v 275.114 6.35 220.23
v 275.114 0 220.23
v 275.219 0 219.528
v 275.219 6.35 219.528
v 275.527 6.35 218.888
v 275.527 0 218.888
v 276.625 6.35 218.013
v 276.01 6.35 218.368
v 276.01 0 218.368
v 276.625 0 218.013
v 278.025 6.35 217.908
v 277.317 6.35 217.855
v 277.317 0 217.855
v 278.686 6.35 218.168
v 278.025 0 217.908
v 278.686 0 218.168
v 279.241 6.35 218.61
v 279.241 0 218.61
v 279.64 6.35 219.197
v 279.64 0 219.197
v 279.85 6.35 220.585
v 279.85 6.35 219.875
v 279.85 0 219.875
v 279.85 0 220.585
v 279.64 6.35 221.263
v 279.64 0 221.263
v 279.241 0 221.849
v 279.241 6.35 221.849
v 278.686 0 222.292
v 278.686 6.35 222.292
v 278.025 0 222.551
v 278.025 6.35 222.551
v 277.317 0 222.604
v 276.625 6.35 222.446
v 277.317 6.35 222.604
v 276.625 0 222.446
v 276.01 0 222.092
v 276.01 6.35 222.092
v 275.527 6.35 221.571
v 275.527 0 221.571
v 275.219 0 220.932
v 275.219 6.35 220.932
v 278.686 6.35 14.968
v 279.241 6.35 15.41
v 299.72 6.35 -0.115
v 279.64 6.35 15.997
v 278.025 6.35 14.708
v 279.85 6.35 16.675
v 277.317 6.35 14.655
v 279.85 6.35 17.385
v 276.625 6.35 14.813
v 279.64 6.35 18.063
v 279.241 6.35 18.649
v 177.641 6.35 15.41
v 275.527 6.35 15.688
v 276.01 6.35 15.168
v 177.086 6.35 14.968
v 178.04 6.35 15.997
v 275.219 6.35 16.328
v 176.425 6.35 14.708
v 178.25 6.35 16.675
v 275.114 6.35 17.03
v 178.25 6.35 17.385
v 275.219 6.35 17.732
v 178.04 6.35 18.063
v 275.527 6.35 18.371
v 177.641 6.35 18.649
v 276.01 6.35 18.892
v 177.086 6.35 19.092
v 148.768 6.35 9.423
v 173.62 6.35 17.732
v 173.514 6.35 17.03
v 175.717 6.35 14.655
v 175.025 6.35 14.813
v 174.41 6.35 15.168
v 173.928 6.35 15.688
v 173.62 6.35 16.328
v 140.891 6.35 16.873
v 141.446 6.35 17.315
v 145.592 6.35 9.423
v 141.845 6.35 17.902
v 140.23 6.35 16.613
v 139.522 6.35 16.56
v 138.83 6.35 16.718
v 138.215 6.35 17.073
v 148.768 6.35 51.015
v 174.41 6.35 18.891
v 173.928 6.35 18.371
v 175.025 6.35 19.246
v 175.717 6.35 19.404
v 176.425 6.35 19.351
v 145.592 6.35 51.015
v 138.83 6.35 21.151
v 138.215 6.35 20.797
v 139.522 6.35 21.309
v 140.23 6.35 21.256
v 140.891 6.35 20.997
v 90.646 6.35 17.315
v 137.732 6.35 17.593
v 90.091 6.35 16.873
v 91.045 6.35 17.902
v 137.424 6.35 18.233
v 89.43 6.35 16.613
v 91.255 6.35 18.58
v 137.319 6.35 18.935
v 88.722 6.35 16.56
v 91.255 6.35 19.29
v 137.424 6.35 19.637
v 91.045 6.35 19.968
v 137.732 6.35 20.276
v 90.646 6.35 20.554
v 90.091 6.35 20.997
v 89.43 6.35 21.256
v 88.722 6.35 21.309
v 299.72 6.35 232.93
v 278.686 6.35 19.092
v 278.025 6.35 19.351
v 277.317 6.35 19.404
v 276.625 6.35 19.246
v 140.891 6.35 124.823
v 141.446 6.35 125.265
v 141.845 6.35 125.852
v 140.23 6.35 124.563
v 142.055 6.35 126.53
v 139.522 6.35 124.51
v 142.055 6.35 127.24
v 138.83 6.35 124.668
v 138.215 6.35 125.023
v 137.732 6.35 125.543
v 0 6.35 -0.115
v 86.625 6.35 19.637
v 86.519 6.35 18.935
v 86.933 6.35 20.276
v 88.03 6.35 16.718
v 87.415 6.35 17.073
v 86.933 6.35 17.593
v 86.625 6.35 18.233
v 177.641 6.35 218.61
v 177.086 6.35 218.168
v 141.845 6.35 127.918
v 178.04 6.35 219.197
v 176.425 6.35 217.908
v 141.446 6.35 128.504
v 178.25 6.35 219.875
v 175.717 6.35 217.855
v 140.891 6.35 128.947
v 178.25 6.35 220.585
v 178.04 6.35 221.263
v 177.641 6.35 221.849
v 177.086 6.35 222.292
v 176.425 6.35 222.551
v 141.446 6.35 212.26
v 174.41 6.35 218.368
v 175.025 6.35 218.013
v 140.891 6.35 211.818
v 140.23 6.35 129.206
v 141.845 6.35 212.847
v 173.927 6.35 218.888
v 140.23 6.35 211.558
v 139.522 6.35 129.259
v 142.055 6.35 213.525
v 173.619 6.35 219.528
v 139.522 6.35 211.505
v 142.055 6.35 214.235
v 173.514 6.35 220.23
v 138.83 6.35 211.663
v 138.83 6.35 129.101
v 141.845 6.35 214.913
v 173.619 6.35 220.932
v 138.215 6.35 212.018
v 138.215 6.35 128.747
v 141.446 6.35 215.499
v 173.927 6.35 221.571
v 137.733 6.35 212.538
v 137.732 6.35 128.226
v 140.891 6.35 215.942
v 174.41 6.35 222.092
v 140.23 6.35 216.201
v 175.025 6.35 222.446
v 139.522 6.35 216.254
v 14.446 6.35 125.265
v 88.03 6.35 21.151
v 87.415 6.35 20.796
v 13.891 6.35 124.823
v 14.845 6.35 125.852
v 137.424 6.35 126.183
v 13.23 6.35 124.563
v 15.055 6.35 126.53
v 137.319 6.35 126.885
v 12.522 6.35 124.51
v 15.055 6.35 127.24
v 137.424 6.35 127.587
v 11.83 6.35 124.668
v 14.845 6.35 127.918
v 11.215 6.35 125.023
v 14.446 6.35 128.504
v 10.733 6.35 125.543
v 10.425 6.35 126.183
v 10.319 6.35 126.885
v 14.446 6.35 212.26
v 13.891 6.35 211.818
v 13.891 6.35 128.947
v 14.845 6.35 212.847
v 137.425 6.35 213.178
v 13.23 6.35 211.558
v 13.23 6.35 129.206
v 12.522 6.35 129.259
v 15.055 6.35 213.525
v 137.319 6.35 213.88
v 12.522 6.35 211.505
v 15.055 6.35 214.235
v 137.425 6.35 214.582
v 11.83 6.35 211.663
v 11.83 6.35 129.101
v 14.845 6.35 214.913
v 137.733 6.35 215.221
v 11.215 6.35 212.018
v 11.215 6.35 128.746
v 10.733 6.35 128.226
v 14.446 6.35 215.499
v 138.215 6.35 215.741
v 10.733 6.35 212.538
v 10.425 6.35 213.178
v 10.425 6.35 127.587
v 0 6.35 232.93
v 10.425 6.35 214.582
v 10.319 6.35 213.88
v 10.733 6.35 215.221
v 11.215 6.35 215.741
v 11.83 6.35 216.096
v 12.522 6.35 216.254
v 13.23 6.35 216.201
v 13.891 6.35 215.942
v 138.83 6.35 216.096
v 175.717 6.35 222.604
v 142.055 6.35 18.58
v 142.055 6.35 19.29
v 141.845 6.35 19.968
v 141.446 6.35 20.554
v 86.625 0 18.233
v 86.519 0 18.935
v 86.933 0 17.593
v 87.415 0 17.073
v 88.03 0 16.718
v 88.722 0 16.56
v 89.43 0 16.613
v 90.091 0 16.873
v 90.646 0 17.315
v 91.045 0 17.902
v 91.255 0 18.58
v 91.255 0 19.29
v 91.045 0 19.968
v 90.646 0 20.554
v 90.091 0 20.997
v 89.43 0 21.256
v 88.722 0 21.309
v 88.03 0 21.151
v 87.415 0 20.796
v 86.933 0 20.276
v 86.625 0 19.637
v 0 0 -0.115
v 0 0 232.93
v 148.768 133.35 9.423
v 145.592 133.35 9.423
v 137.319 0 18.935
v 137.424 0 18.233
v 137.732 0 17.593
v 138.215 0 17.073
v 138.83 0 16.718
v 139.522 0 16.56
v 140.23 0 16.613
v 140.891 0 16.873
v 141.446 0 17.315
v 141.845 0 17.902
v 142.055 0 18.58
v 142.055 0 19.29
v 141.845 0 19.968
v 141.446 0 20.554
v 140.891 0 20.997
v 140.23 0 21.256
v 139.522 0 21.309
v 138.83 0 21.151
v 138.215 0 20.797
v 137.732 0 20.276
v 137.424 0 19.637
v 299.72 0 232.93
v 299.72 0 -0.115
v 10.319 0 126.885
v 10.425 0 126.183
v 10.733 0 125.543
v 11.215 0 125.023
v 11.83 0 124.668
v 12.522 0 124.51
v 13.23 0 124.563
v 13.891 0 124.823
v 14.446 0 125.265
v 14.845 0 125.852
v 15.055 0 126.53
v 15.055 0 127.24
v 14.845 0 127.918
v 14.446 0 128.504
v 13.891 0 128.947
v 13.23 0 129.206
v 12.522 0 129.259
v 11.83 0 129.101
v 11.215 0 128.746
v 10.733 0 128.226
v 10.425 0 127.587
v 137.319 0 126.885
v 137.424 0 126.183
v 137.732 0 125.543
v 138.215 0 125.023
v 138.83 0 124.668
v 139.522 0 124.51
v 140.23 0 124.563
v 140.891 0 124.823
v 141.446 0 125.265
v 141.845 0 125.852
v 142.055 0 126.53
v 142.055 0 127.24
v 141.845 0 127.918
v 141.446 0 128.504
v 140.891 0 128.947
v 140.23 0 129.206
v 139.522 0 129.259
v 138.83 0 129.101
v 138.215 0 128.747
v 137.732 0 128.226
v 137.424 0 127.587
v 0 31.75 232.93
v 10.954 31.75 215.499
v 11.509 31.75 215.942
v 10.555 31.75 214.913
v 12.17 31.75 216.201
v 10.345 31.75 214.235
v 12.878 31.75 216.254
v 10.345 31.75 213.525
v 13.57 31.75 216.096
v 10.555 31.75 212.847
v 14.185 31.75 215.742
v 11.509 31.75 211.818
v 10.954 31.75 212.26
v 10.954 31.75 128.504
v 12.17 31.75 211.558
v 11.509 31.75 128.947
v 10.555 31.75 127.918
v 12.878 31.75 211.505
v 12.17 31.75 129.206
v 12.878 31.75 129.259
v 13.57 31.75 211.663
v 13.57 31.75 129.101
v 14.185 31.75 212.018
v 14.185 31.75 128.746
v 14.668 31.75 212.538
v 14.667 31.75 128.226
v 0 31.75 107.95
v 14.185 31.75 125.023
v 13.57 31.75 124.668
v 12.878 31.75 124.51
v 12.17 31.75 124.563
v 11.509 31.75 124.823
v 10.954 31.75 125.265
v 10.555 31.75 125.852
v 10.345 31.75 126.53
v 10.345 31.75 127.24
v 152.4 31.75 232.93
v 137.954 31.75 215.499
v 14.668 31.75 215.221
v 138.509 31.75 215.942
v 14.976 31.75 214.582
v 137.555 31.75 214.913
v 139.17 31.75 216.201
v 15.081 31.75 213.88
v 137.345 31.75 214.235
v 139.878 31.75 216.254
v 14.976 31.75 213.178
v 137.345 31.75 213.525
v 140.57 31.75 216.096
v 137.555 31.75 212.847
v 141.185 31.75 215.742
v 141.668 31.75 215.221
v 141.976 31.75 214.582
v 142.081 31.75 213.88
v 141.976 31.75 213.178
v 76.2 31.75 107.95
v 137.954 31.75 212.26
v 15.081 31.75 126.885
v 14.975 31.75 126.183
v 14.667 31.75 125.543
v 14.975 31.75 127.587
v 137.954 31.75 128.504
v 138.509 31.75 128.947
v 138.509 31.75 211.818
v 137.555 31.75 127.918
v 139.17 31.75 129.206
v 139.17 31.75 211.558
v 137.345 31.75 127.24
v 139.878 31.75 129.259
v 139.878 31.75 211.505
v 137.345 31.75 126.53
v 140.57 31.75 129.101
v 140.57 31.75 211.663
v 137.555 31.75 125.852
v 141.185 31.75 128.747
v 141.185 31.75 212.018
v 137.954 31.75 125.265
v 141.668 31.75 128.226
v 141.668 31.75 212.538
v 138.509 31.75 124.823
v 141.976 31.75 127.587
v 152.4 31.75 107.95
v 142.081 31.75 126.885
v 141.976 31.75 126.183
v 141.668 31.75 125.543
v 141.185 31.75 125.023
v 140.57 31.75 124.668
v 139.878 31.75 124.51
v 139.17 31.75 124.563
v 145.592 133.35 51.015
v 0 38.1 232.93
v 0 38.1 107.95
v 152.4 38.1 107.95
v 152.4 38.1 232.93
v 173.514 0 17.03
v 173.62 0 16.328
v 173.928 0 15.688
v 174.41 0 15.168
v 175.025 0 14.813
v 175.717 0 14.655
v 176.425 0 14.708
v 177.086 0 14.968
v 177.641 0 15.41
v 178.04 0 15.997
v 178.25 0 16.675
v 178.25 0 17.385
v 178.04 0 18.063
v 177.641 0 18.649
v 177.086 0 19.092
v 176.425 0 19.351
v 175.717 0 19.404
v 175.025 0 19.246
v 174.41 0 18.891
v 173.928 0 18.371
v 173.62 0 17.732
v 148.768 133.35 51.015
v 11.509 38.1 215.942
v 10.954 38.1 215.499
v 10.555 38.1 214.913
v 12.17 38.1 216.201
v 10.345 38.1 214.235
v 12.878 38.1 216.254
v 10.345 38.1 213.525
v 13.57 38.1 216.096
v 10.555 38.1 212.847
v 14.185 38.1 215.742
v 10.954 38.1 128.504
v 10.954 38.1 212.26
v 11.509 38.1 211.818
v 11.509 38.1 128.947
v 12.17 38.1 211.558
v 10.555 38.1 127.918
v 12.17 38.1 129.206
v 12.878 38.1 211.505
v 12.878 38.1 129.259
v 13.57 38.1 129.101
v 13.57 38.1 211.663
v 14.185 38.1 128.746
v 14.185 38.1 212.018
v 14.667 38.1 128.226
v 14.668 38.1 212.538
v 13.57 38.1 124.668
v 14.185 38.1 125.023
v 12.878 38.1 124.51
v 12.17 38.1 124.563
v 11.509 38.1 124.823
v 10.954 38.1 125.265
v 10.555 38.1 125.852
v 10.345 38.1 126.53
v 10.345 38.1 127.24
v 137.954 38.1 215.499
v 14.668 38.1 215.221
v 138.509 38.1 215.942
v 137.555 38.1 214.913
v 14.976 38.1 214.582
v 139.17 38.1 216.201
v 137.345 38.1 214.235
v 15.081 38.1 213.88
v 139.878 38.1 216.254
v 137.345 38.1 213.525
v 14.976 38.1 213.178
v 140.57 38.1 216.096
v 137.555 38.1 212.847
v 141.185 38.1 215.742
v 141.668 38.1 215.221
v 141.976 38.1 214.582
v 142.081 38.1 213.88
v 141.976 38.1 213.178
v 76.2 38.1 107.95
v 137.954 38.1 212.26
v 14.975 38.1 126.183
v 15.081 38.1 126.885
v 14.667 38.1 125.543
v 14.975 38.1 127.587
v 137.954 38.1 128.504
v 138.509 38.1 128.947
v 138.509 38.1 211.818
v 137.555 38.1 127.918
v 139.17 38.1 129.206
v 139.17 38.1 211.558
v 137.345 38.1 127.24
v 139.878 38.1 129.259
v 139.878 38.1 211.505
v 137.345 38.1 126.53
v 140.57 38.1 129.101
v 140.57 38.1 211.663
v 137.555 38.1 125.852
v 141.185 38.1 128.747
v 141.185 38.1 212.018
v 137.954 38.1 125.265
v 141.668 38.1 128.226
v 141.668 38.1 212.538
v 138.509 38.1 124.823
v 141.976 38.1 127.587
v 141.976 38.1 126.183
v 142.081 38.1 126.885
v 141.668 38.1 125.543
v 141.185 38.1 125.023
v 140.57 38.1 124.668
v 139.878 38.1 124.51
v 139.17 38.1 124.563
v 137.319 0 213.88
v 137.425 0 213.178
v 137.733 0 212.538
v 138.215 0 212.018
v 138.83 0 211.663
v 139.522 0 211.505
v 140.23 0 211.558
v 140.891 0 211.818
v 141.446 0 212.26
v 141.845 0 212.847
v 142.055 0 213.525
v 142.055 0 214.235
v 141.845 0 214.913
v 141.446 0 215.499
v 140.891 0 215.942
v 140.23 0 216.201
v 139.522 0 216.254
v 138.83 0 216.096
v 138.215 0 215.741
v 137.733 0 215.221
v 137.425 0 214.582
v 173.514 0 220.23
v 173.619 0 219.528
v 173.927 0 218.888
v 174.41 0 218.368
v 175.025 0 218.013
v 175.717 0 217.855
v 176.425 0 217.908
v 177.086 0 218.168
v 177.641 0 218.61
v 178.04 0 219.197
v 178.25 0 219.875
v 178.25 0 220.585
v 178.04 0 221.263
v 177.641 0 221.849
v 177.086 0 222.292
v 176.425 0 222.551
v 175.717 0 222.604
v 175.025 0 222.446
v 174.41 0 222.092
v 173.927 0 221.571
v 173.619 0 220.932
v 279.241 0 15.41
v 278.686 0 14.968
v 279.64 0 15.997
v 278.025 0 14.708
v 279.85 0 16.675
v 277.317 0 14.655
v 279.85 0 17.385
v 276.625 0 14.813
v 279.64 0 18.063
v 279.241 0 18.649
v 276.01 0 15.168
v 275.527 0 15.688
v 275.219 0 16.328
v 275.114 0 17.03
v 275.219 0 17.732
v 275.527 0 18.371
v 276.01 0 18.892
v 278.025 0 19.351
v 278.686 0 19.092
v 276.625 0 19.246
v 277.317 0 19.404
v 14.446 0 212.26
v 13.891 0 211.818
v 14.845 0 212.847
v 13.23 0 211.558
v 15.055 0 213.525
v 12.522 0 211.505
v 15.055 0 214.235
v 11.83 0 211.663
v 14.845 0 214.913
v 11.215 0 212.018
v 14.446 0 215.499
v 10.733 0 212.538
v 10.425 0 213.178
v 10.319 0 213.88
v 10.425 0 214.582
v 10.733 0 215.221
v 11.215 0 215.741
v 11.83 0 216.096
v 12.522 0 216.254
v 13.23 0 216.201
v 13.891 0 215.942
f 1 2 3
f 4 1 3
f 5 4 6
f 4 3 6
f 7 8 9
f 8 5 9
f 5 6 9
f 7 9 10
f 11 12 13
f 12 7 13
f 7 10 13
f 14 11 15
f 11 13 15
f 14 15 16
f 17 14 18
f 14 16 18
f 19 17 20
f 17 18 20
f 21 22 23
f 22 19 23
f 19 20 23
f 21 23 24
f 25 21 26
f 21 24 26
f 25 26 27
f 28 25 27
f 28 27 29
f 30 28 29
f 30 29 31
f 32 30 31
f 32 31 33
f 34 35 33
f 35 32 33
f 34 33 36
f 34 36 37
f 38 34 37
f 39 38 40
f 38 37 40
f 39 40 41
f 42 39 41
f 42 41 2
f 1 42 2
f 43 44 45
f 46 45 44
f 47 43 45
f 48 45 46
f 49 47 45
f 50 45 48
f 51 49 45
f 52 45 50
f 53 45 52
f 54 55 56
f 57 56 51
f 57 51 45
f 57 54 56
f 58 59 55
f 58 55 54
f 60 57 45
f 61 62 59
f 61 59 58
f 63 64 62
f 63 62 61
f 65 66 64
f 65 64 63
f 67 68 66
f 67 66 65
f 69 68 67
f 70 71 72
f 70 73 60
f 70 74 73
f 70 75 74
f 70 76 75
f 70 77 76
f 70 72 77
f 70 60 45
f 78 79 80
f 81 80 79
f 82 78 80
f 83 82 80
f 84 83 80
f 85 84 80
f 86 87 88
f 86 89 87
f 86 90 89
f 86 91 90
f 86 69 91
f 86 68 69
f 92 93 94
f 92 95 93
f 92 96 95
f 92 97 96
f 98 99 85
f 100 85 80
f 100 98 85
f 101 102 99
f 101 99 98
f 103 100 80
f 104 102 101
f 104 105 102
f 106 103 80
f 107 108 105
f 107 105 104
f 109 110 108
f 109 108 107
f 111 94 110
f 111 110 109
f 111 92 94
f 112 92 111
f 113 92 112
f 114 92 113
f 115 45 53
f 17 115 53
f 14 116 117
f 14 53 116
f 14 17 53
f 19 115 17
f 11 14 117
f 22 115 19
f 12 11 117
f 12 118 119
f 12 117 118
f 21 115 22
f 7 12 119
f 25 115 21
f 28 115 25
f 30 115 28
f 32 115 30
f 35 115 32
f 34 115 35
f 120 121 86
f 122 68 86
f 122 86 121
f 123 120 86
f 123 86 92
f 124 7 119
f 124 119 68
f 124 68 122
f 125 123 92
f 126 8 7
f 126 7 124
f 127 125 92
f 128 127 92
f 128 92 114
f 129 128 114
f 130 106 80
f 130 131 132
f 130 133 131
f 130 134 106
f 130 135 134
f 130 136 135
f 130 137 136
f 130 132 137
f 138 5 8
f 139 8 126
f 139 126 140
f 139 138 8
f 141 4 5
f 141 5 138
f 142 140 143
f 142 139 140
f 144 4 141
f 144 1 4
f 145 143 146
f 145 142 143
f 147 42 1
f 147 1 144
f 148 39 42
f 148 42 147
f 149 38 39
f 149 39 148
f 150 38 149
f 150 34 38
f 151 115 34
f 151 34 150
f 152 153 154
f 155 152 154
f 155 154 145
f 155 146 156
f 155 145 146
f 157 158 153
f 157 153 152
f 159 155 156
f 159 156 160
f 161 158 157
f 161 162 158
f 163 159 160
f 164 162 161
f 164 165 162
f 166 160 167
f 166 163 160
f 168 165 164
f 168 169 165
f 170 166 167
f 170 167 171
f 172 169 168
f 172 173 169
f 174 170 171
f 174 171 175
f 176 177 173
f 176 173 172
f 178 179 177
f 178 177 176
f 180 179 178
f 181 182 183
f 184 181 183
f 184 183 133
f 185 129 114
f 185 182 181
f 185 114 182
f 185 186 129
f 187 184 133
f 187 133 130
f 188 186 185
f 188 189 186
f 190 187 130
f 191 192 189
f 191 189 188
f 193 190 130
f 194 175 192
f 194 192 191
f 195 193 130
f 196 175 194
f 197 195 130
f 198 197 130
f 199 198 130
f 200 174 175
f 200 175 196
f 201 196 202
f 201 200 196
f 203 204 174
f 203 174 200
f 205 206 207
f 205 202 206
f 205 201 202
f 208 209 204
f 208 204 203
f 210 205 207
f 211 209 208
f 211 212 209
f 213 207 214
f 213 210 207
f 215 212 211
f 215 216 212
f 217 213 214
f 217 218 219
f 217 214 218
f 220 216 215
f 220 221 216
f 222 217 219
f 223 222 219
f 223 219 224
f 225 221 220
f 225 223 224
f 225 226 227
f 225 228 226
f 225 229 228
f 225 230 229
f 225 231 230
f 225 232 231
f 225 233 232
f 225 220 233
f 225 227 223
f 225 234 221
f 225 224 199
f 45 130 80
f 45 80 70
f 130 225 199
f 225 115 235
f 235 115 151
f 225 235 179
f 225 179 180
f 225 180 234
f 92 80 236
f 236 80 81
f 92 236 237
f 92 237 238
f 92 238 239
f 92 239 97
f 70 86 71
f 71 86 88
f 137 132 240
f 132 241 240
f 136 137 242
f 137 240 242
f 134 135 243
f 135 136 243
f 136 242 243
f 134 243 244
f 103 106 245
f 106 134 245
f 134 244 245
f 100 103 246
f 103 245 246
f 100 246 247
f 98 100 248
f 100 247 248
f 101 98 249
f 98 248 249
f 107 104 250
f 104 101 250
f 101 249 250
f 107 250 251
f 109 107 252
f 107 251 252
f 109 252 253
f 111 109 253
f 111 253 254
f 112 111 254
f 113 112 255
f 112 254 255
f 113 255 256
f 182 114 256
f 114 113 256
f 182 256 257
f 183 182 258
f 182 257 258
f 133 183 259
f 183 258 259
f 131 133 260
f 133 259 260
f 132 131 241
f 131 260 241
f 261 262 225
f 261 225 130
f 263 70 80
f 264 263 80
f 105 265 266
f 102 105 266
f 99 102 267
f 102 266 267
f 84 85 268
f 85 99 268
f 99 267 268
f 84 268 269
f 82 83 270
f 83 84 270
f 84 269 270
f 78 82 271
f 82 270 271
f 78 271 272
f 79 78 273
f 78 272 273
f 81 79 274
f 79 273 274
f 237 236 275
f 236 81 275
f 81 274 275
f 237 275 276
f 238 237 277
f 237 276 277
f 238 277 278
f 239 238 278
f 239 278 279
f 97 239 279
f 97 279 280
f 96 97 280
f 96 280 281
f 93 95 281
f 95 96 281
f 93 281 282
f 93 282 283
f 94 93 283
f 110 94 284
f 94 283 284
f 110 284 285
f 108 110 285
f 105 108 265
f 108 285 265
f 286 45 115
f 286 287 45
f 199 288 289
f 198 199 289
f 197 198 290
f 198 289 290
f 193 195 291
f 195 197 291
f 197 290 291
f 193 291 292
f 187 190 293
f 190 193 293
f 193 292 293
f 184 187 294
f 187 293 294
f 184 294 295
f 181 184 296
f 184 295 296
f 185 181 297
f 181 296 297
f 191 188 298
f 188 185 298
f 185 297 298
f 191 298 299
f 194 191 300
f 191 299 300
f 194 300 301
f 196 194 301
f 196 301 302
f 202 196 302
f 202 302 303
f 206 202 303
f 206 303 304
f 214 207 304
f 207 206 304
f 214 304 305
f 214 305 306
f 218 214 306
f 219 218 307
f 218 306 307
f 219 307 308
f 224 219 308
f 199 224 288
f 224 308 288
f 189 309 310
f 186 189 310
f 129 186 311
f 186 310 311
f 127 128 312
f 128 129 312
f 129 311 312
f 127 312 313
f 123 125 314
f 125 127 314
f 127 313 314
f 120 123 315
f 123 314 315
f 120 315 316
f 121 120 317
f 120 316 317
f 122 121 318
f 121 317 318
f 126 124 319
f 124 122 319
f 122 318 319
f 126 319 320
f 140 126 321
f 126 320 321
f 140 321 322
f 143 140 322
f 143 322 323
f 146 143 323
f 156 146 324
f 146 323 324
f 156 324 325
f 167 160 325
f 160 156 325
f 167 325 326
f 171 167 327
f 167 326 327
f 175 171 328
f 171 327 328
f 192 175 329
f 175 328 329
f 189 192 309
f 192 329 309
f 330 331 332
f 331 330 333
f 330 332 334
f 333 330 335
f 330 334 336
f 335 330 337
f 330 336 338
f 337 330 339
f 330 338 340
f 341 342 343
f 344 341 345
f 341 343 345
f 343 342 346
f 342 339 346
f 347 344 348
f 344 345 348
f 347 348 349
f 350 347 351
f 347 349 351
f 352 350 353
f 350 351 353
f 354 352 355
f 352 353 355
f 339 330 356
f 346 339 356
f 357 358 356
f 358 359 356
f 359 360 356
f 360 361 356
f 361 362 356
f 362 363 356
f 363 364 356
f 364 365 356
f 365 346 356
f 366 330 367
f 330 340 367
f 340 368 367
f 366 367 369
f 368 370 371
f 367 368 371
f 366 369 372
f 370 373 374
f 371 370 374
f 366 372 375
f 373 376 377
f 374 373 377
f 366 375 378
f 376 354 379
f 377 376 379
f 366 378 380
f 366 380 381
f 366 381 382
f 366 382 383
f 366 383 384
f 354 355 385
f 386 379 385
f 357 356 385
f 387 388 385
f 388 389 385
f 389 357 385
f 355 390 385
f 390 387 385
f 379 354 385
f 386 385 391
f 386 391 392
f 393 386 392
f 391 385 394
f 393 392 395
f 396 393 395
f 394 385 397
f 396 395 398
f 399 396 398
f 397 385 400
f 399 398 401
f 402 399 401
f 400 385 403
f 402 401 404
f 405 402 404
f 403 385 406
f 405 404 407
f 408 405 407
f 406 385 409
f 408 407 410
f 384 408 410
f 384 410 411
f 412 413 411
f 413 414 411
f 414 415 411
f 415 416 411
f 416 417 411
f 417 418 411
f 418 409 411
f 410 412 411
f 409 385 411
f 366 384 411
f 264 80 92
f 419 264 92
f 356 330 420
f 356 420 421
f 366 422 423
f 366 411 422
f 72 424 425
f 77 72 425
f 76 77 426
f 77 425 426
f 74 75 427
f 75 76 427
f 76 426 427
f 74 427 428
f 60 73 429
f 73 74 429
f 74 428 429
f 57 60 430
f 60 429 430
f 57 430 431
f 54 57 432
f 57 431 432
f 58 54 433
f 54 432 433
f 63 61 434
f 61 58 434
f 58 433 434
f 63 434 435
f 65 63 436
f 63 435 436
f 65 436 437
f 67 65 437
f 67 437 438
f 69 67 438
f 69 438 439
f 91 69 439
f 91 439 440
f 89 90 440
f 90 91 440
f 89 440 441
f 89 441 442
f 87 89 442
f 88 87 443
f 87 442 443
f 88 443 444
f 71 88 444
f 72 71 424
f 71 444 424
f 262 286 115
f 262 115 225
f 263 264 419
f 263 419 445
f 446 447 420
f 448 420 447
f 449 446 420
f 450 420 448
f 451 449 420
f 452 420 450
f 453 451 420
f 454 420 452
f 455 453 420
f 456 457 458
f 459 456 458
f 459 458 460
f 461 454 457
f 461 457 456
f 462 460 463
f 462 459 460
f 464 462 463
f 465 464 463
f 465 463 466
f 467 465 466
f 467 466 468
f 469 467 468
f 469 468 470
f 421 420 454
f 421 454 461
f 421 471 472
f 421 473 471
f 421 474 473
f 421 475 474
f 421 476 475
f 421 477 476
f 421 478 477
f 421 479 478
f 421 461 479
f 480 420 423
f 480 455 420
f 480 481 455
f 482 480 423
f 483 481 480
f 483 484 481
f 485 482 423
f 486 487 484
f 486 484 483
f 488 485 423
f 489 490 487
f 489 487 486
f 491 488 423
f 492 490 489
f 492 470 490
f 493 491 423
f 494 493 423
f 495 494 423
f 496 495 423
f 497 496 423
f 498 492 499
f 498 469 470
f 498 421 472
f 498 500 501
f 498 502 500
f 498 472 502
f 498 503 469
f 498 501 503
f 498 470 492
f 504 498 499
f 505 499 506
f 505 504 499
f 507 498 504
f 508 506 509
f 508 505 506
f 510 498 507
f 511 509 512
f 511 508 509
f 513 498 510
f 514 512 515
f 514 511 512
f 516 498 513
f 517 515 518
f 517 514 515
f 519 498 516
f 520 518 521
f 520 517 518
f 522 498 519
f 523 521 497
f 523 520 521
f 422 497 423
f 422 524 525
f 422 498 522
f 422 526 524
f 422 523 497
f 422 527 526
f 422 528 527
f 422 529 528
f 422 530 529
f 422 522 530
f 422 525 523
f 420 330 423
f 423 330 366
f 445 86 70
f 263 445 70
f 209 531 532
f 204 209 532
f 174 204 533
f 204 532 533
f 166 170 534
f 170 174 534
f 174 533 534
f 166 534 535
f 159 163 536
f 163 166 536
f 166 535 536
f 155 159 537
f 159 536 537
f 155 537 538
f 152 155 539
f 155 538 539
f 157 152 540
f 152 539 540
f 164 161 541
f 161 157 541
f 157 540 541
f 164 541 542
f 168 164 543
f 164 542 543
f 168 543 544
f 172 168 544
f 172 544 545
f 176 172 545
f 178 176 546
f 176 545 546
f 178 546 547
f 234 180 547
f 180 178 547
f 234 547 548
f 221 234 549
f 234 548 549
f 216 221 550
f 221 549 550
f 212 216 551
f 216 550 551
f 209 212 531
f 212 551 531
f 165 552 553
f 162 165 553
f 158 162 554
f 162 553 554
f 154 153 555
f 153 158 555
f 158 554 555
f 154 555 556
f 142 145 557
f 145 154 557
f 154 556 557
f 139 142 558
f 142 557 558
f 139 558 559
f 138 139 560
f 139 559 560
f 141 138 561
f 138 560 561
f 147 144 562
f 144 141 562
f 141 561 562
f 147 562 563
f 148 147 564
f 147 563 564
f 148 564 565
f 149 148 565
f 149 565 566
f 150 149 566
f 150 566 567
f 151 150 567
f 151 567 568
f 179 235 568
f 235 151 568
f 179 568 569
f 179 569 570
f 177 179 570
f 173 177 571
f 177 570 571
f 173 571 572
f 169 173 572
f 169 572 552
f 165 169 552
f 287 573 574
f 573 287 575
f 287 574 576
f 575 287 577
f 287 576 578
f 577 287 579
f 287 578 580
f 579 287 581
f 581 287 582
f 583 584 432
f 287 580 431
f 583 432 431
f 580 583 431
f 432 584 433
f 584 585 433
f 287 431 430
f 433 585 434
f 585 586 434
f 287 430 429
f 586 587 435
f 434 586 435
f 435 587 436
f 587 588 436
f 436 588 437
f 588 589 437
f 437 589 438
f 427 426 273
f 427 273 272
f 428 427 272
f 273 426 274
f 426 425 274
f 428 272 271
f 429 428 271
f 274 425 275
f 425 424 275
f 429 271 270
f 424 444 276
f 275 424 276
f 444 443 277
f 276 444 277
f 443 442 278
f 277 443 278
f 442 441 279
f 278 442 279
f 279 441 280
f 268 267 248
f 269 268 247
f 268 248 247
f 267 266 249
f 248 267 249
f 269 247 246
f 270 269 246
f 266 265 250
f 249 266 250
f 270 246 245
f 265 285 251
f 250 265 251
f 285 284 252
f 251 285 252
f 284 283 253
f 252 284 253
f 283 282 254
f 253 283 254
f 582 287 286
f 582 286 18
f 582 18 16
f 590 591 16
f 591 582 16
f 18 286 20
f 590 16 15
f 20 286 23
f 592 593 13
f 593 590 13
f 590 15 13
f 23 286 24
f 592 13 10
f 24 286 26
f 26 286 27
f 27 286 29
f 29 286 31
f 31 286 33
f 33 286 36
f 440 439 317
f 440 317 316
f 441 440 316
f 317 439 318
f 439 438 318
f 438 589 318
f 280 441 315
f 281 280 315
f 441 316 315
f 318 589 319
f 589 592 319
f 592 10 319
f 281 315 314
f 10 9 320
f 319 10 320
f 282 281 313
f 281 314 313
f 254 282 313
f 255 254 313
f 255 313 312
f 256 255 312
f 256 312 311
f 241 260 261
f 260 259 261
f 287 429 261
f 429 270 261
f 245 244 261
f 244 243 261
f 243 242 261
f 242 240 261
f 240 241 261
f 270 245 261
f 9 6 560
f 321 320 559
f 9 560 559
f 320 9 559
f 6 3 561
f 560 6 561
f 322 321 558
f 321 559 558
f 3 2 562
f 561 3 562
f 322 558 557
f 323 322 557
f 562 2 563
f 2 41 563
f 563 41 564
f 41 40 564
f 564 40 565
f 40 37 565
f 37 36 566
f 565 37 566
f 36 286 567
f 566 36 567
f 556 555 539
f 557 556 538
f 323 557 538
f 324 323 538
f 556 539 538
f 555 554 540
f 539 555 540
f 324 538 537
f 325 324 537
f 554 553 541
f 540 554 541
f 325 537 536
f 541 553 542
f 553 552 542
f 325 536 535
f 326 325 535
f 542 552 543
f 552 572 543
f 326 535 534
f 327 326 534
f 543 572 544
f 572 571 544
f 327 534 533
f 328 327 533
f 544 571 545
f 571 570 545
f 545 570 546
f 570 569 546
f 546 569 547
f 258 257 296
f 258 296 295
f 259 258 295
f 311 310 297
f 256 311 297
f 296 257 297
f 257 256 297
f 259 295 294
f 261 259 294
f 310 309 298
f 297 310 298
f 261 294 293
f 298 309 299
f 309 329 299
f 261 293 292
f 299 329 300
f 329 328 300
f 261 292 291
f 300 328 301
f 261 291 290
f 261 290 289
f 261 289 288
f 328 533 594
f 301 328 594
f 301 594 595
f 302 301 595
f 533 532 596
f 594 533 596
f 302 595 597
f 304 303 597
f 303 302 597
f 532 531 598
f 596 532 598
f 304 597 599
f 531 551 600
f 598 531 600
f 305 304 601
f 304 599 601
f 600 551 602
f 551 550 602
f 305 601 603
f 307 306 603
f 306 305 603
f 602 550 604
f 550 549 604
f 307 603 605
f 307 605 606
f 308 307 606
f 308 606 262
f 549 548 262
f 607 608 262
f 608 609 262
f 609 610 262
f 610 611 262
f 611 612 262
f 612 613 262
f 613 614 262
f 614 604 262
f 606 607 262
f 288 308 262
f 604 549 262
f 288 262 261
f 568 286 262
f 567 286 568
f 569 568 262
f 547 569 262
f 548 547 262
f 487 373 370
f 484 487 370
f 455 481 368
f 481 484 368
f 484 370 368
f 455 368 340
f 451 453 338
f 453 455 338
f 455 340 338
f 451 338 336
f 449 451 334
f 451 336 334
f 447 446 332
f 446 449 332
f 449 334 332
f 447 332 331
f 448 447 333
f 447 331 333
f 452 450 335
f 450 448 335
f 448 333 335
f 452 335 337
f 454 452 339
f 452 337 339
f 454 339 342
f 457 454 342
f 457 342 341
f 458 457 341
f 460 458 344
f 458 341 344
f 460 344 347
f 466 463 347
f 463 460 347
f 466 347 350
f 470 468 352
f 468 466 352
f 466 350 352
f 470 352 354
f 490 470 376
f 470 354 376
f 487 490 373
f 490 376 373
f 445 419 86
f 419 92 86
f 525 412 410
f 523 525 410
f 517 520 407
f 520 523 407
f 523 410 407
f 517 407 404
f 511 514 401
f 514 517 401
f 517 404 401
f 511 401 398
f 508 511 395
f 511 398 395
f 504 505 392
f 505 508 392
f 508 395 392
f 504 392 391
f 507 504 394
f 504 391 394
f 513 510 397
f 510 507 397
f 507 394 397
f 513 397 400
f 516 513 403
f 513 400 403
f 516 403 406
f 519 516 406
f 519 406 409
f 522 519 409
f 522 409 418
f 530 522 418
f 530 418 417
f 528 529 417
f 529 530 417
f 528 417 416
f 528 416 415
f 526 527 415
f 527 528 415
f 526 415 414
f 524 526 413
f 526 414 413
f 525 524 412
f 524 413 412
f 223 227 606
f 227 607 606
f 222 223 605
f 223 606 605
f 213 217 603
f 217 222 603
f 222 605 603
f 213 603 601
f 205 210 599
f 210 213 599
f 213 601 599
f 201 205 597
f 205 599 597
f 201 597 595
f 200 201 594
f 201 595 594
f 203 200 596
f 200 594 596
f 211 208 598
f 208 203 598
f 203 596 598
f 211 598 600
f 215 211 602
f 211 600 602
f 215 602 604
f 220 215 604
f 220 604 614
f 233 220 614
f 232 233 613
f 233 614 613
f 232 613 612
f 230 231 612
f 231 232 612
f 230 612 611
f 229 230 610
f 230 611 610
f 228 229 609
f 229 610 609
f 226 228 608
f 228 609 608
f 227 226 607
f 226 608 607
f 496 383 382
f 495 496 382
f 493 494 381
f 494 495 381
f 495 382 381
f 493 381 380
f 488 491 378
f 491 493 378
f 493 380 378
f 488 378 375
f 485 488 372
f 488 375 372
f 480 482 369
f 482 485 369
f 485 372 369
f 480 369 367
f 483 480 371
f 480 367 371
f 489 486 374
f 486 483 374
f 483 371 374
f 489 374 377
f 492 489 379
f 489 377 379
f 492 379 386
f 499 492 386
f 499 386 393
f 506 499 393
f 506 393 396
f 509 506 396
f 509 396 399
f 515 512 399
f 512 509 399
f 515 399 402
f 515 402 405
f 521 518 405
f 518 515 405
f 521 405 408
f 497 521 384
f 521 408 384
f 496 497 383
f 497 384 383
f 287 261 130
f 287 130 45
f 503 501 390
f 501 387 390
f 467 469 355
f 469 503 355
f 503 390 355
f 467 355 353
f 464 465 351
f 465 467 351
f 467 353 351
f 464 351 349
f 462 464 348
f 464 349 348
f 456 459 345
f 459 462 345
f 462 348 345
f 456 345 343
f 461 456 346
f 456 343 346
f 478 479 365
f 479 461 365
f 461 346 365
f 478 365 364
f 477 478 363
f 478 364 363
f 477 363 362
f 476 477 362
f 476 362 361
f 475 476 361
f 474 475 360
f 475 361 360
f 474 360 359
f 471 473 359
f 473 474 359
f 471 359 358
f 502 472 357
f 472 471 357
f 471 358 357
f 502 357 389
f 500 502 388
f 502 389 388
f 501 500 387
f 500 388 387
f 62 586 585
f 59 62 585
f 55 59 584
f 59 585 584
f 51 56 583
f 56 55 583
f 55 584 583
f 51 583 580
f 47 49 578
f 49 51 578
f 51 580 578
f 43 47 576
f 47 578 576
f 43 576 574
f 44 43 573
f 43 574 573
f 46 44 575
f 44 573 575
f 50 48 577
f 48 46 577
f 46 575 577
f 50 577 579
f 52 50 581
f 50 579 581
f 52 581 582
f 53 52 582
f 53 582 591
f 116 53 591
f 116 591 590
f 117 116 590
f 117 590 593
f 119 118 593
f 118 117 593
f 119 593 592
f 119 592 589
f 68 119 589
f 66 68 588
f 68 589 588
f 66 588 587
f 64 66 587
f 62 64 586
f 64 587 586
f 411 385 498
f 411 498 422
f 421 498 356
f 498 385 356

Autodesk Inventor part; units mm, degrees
ref_plane "YZ Plane" through (0, 0, 0) normal (1, 0, 0) x (0, 1, 0)
sketch "Sketch1" plane through (0, 0, 0) normal (0, 1, 0) x (-1, 0, 0)
  line L0 (0, -0.1152) -> (-299.72, -0.1152)
  line L1 (-299.72, -0.1152) -> (-299.72, 232.9298)
  line L2 (-299.72, 232.9298) -> (0, 232.9298)
  line L3 (0, 232.9298) -> (0, -0.1152)
  line L4 (-299.72, 232.9298) -> (-293.37, 232.9298) construction
  line L5 (-293.37, 232.9298) -> (-293.37, -0.1152) construction
  line L6 (-293.37, -0.1152) -> (-299.72, -0.1152) construction
  line L7 (-299.72, -0.1152) -> (-299.72, 232.9298) construction
  line L8 (-293.37, 232.9298) -> (-290.195, 232.9298) construction
  line L9 (-290.195, 232.9298) -> (-290.195, -0.1152) construction
  line L10 (-293.37, -0.1152) -> (-293.37, 232.9298) construction
  line L11 (-290.195, 232.9298) -> (-264.795, 232.9298) construction
  line L12 (-264.795, 232.9298) -> (-264.795, 207.5298) construction
  line L13 (-264.795, 207.5298) -> (-290.195, 207.5298) construction
  line L14 (-290.195, 207.5298) -> (-290.195, 232.9298) construction
  line L15 (-264.795, 232.9298) -> (-290.195, 207.5298) construction
  line L16 (-264.795, 207.5298) -> (-290.195, 232.9298) construction
  circle A0 centre (-277.495, 220.2298) radius 2.3813
  line L17 (-264.795, 207.5298) -> (-188.595, 207.5298) construction
  line L18 (-264.795, 207.5298) -> (-188.595, 207.5298) construction
  line L19 (-188.595, 207.5298) -> (-163.195, 207.5298) construction
  line L20 (-163.195, 207.5298) -> (-163.195, 232.9298) construction
  line L21 (-163.195, 232.9298) -> (-188.595, 232.9298) construction
  line L22 (-188.595, 232.9298) -> (-188.595, 207.5298) construction
  line L23 (-163.195, 232.9298) -> (-188.595, 207.5298) construction
  line L24 (-188.595, 232.9298) -> (-163.195, 207.5298) construction
  line L25 (-290.195, -0.1152) -> (9.525, -0.1152) construction
  line L26 (9.525, -0.1152) -> (9.525, 3.1868) construction
  circle A1 centre (-175.895, 220.2298) radius 2.3813
  line L27 (-299.72, -0.1152) -> (0, -0.1152) construction
  line L28 (0, -0.1152) -> (0, 4.3298) construction
  line L29 (-299.72, 4.3298) -> (-299.72, -0.1152) construction
  line L30 (-290.195, 4.3298) -> (-264.795, 4.3298) construction
  line L31 (-264.795, 4.3298) -> (-264.795, 29.7298) construction
  line L32 (-264.795, 29.7298) -> (-290.195, 29.7298) construction
  line L33 (-290.195, 29.7298) -> (-290.195, 4.3298) construction
  line L34 (-264.795, 29.7298) -> (-188.595, 29.7298) construction
  line L35 (-188.595, 29.7298) -> (-163.195, 29.7298) construction
  line L36 (-163.195, 29.7298) -> (-163.195, 4.3298) construction
  line L37 (-163.195, 4.3298) -> (-188.595, 4.3298) construction
  line L38 (-188.595, 4.3298) -> (-188.595, 29.7298) construction
  line L39 (-163.195, 4.3298) -> (-188.595, 29.7298) construction
  line L40 (-188.595, 4.3298) -> (-163.195, 29.7298) construction
  line L41 (-264.795, 4.3298) -> (-290.195, 29.7298) construction
  line L42 (-290.195, 4.3298) -> (-264.795, 29.7298) construction
  circle A2 centre (-175.895, 17.0298) radius 2.3812
  circle A3 centre (-277.495, 17.0298) radius 2.3813
  line L43 (0, 232.9298) -> (-152.4, 232.9298) construction
  line L44 (-152.4, 232.9298) -> (-152.4, 226.5798) construction
  line L45 (-152.4, 226.5798) -> (0, 226.5798) construction
  line L46 (0, 226.5798) -> (0, 232.9298) construction
  line L47 (0, 226.5798) -> (-25.4, 226.5798) construction
  line L48 (-25.4, 226.5798) -> (-25.4, 201.1798) construction
  line L49 (-25.4, 201.1798) -> (0, 201.1798) construction
  line L50 (0, 201.1798) -> (0, 226.5798) construction
  line L51 (-152.4, 226.5798) -> (-127, 226.5798) construction
  line L52 (-127, 226.5798) -> (-127, 201.1798) construction
  line L53 (-127, 201.1798) -> (-152.4, 201.1798) construction
  line L54 (-152.4, 201.1798) -> (-152.4, 226.5798) construction
  line L55 (0, 201.1798) -> (-25.4, 226.5798) construction
  line L56 (-25.4, 201.1798) -> (0, 226.5798) construction
  line L57 (-127, 201.1798) -> (-152.4, 226.5798) construction
  line L58 (-152.4, 201.1798) -> (-127, 226.5798) construction
  circle A4 centre (-12.7, 213.8798) radius 2.3812
  circle A5 centre (-139.7, 213.8798) radius 2.3812
  line L59 (0, 226.5798) -> (-6.35, 226.5798) construction
  line L60 (-6.35, 226.5798) -> (-6.35, 114.1848) construction
  line L61 (-6.35, 114.1848) -> (0, 114.1848) construction
  line L62 (0, 114.1848) -> (0, 226.5798) construction
  line L63 (0, 114.1848) -> (-25.4, 114.1848) construction
  line L64 (-25.4, 114.1848) -> (-25.4, 139.5848) construction
  line L65 (-25.4, 139.5848) -> (0, 139.5848) construction
  line L66 (0, 139.5848) -> (0, 114.1848) construction
  line L67 (-152.4, 226.5798) -> (-146.05, 226.5798) construction
  line L68 (-146.05, 226.5798) -> (-146.05, 114.1848) construction
  line L69 (-146.05, 114.1848) -> (-152.4, 114.1848) construction
  line L70 (-152.4, 114.1848) -> (-152.4, 226.5798) construction
  line L71 (-152.4, 114.1848) -> (-127, 114.1848) construction
  line L72 (-127, 114.1848) -> (-127, 139.5848) construction
  line L73 (-127, 139.5848) -> (-152.4, 139.5848) construction
  line L74 (-152.4, 139.5848) -> (-152.4, 114.1848) construction
  line L75 (0, -0.1152) -> (-152.4, -0.1152) construction
  line L76 (-152.4, -0.1152) -> (-152.4, 6.2348) construction
  line L77 (-152.4, 6.2348) -> (0, 6.2348) construction
  line L78 (0, 6.2348) -> (0, -0.1152) construction
  line L79 (-152.4, 6.2348) -> (-127, 6.2348) construction
  line L80 (-127, 6.2348) -> (-127, 31.6348) construction
  line L81 (-127, 31.6348) -> (-152.4, 31.6348) construction
  line L82 (-152.4, 31.6348) -> (-152.4, 6.2348) construction
  line L83 (0, 114.1848) -> (-25.4, 139.5848) construction
  line L84 (-25.4, 114.1848) -> (0, 139.5848) construction
  line L85 (-127, 114.1848) -> (-152.4, 139.5848) construction
  line L86 (-152.4, 114.1848) -> (-127, 139.5848) construction
  line L87 (-127, 6.2348) -> (-152.4, 31.6348) construction
  line L88 (-152.4, 6.2348) -> (-127, 31.6348) construction
  circle A6 centre (-139.7, 18.9348) radius 2.3813
  circle A7 centre (-139.7, 126.8848) radius 2.3813
  circle A8 centre (-12.7, 126.8848) radius 2.3812
  line L89 (-152.4, -0.1152) -> (-76.2, -0.1152) construction
  line L90 (-76.2, -0.1152) -> (-76.2, 6.2348) construction
  line L91 (-76.2, 6.2348) -> (-152.4, 6.2348) construction
  line L92 (-152.4, 6.2348) -> (-152.4, -0.1152) construction
  line L93 (-76.2, 6.2348) -> (-101.6, 6.2348) construction
  line L94 (-101.6, 6.2348) -> (-101.6, 31.6348) construction
  line L95 (-101.6, 31.6348) -> (-76.2, 31.6348) construction
  line L96 (-76.2, 31.6348) -> (-76.2, 6.2348) construction
  line L97 (-76.2, 31.6348) -> (-101.6, 6.2348) construction
  line L98 (-76.2, 6.2348) -> (-101.6, 31.6348) construction
  circle A9 centre (-88.9, 18.9348) radius 2.3812
  point P0 (0, 0)
  dimension "d0" = 299.72
  dimension "d1" = 233.045
  dimension "d26" = 6.35
  dimension "d27" = 233.045
  dimension "d28" = 3.175
  dimension "d29" = 233.045
  dimension "d30" = 25.4
  dimension "d31" = 25.4
  dimension "d34" = 4.7625
  dimension "d36" = 76.2
  dimension "d38" = 25.4
  dimension "d39" = 25.4
  dimension "d44" = 3.302
  dimension "d50" = 4.7625
  dimension "d54" = 4.445
  dimension "d55" = 25.4
  dimension "d56" = 25.4
  dimension "d57" = 76.2
  dimension "d58" = 25.4
  dimension "d59" = 25.4
  dimension "d60" = 4.7625
  dimension "d61" = 4.7625
  dimension "d80" = 152.4
  dimension "d81" = 6.35
  dimension "d82" = 25.4
  dimension "d83" = 25.4
  dimension "d84" = 25.4
  dimension "d85" = 25.4
  dimension "d86" = 4.7625
  dimension "d87" = 4.7625
  dimension "d88" = 6.35
  dimension "d89" = 112.395
  dimension "d90" = 25.4
  dimension "d91" = 25.4
  dimension "d92" = 6.35
  dimension "d93" = 112.395
  dimension "d94" = 25.4
  dimension "d95" = 25.4
  dimension "d96" = 152.4
  dimension "d97" = 6.35
  dimension "d98" = 25.4
  dimension "d99" = 25.4
  dimension "d100" = 4.7625
  dimension "d101" = 4.7625
  dimension "d102" = 4.7625
  dimension "d103" = 76.2
  dimension "d104" = 6.35
  dimension "d105" = 25.4
  dimension "d106" = 25.4
  dimension "d107" = 4.7625
extrude "Extrusion1" add sketch "Sketch1" along normal blind 6.35
ref_plane "Work Plane8" through (0, 31.75, 0) normal (0, 1, 0) x (1, 0, 0)
sketch "Sketch4" plane through (0, 31.75, 0) normal (0, 1, 0) x (1, 0, 0)
  line L0 (0, -232.9298) -> (299.72, -232.9298) projected
  line L1 (0, -232.9298) -> (0, 0)
  line L2 (152.4, -232.9298) -> (0, -232.9298)
  line L3 (0, 0) -> (0, -232.9298) projected
  line L4 (76.2, -107.95) -> (0, -107.95)
  line L5 (0, -107.95) -> (0, -6.35)
  line L6 (152.4, -114.1848) -> (0, -114.1848) construction
  line L7 (152.4, -114.1848) -> (127, -114.1848) construction
  line L8 (127, -114.1848) -> (127, -139.5848) construction
  line L9 (127, -139.5848) -> (152.4, -139.5848) construction
  line L10 (152.4, -139.5848) -> (152.4, -114.1848) construction
  line L11 (0, -114.1848) -> (25.4, -114.1848) construction
  line L12 (25.4, -114.1848) -> (25.4, -139.5848) construction
  line L13 (25.4, -139.5848) -> (0, -139.5848) construction
  line L14 (0, -139.5848) -> (0, -114.1848) construction
  line L15 (0, -114.1848) -> (0, -226.5798) construction
  line L16 (0, -226.5798) -> (25.4, -226.5798) construction
  line L17 (25.4, -226.5798) -> (25.4, -201.1798) construction
  line L18 (25.4, -201.1798) -> (0, -201.1798) construction
  line L19 (0, -201.1798) -> (0, -226.5798) construction
  line L20 (152.4, -226.5798) -> (0, -226.5798) construction
  line L21 (152.4, -226.5798) -> (127, -226.5798) construction
  line L22 (127, -226.5798) -> (127, -201.1798) construction
  line L23 (127, -201.1798) -> (152.4, -201.1798) construction
  line L24 (152.4, -201.1798) -> (152.4, -226.5798) construction
  line L25 (127, -114.1848) -> (152.4, -139.5848) construction
  line L26 (152.4, -114.1848) -> (127, -139.5848) construction
  line L27 (0, -114.1848) -> (25.4, -139.5848) construction
  line L28 (0, -139.5848) -> (25.4, -114.1848) construction
  line L29 (0, -201.1798) -> (25.4, -226.5798) construction
  line L30 (25.4, -201.1798) -> (0, -226.5798) construction
  line L31 (127, -201.1798) -> (152.4, -226.5798) construction
  line L32 (152.4, -201.1798) -> (127, -226.5798) construction
  circle A0 centre (12.7, -213.8798) radius 2.3813
  circle A1 centre (139.7, -213.8798) radius 2.3813
  circle A2 centre (139.7, -126.8848) radius 2.3813
  circle A3 centre (12.7, -126.8848) radius 2.3812
  line L33 (76.2, -107.95) -> (152.4, -107.95)
  line L34 (152.4, -107.95) -> (152.4, -232.9298)
  line L35 (0, -232.9298) -> (299.72, -232.9298) projected
  point P0 (76.2, -6.35)
  point P1 (152.4, -6.35)
  dimension "d18" = 101.6
  dimension "d62" = 25.4
  dimension "d63" = 25.4
  dimension "d64" = 25.4
  dimension "d65" = 25.4
  dimension "d66" = 25.4
  dimension "d67" = 25.4
  dimension "d68" = 25.4
  dimension "d69" = 25.4
  dimension "d74" = 4.7625
  dimension "d75" = 4.7625
  dimension "d76" = 4.7625
  dimension "d77" = 4.7625
extrude "Extrusion4" add sketch "Sketch4" along normal blind 6.35
ref_plane "Work Plane7" through (152.4, 6.35, 0) normal (0, 0, -1) x (-1, 0, 0)
sketch "Sketch6" plane through (152.4, 6.35, 0) normal (0, 0, -1) x (-1, 0, 0)
  line L0 (152.4, 54.61) -> (0, 54.61) construction
  line L1 (0, 48.26) -> (152.4, 48.26) construction
  line L2 (76.2, 54.61) -> (0, 54.61) construction
  line L3 (0, 54.61) -> (0, 48.26) construction
  line L4 (0, 48.26) -> (76.2, 48.26) construction
  line L5 (76.2, 48.26) -> (76.2, 54.61) construction
  line L6 (0, 48.26) -> (25.4, 48.26) construction
  line L7 (25.4, 48.26) -> (25.4, 24.13) construction
  line L8 (25.4, 24.13) -> (0, 24.13) construction
  line L9 (0, 24.13) -> (0, 48.26) construction
  line L10 (25.4, 24.13) -> (0, 48.26) construction
  line L11 (0, 24.13) -> (25.4, 48.26) construction
  line L12 (0, 0) -> (-147.32, 0) construction
  line L13 (25.4, 24.13) -> (0, 0) construction
  line L14 (0, 0) -> (25.4, 0) construction
  line L15 (0, 0) -> (25.4, 0) construction
  line L16 (25.4, 0) -> (0, 24.13) construction
  line L17 (76.2, 48.26) -> (50.8, 48.26) construction
  line L18 (50.8, 48.26) -> (50.8, 24.13) construction
  line L19 (50.8, 24.13) -> (76.2, 24.13) construction
  line L20 (76.2, 24.13) -> (76.2, 48.26) construction
  line L21 (-147.32, 0) -> (152.4, 0) construction
  line L22 (50.8, 24.13) -> (76.2, 24.13) construction
  line L23 (76.2, 24.13) -> (76.2, 0) construction
  line L24 (76.2, 0) -> (50.8, 0) construction
  line L25 (50.8, 0) -> (50.8, 24.13) construction
  line L26 (50.8, 48.26) -> (76.2, 24.13) construction
  line L27 (76.2, 0) -> (76.2, 48.26) construction
  line L28 (76.2, 48.26) -> (50.8, 24.13) construction
  line L29 (50.8, 24.13) -> (76.2, 0) construction
  line L30 (76.2, 24.13) -> (50.8, 0) construction
  circle A0 centre (12.7, 36.195) radius 2.3812
  circle A1 centre (63.5, 36.195) radius 2.3812
  circle A2 centre (63.5, 12.065) radius 2.3812
  circle A3 centre (12.7, 12.065) radius 2.3813
  point P0 (152.4, -6.35)
  dimension "d108" = 76.2
  dimension "d109" = 6.35
  dimension "d110" = 25.4
  dimension "d111" = 24.13
  dimension "d112" = 25.4
  dimension "d114" = 25.4
  dimension "d115" = 24.13
  dimension "d116" = 4.7625
  dimension "d117" = 4.7625
  dimension "d118" = 4.7625
  dimension "d119" = 4.7625
extrude "Extrusion5" cut sketch "Sketch6" against normal blind 6.35
sketch "Sketch11" plane through (0, 6.35, 0) normal (0, 1, 0) x (1, 0, 0)
  line L0 (145.5925, -51.0146) -> (148.7675, -51.0146)
  line L1 (148.7675, -51.0146) -> (148.7675, -9.4234)
  line L2 (148.7675, -9.4234) -> (145.5925, -9.4234)
  line L3 (145.5925, -9.4234) -> (145.5925, -51.0146)
  point P0 (0, 0)
  dimension "d169" = 3.175
extrude "Extrusion8" add sketch "Sketch11" along normal blind 127
properties part number "UpperChassis_Base_2"
